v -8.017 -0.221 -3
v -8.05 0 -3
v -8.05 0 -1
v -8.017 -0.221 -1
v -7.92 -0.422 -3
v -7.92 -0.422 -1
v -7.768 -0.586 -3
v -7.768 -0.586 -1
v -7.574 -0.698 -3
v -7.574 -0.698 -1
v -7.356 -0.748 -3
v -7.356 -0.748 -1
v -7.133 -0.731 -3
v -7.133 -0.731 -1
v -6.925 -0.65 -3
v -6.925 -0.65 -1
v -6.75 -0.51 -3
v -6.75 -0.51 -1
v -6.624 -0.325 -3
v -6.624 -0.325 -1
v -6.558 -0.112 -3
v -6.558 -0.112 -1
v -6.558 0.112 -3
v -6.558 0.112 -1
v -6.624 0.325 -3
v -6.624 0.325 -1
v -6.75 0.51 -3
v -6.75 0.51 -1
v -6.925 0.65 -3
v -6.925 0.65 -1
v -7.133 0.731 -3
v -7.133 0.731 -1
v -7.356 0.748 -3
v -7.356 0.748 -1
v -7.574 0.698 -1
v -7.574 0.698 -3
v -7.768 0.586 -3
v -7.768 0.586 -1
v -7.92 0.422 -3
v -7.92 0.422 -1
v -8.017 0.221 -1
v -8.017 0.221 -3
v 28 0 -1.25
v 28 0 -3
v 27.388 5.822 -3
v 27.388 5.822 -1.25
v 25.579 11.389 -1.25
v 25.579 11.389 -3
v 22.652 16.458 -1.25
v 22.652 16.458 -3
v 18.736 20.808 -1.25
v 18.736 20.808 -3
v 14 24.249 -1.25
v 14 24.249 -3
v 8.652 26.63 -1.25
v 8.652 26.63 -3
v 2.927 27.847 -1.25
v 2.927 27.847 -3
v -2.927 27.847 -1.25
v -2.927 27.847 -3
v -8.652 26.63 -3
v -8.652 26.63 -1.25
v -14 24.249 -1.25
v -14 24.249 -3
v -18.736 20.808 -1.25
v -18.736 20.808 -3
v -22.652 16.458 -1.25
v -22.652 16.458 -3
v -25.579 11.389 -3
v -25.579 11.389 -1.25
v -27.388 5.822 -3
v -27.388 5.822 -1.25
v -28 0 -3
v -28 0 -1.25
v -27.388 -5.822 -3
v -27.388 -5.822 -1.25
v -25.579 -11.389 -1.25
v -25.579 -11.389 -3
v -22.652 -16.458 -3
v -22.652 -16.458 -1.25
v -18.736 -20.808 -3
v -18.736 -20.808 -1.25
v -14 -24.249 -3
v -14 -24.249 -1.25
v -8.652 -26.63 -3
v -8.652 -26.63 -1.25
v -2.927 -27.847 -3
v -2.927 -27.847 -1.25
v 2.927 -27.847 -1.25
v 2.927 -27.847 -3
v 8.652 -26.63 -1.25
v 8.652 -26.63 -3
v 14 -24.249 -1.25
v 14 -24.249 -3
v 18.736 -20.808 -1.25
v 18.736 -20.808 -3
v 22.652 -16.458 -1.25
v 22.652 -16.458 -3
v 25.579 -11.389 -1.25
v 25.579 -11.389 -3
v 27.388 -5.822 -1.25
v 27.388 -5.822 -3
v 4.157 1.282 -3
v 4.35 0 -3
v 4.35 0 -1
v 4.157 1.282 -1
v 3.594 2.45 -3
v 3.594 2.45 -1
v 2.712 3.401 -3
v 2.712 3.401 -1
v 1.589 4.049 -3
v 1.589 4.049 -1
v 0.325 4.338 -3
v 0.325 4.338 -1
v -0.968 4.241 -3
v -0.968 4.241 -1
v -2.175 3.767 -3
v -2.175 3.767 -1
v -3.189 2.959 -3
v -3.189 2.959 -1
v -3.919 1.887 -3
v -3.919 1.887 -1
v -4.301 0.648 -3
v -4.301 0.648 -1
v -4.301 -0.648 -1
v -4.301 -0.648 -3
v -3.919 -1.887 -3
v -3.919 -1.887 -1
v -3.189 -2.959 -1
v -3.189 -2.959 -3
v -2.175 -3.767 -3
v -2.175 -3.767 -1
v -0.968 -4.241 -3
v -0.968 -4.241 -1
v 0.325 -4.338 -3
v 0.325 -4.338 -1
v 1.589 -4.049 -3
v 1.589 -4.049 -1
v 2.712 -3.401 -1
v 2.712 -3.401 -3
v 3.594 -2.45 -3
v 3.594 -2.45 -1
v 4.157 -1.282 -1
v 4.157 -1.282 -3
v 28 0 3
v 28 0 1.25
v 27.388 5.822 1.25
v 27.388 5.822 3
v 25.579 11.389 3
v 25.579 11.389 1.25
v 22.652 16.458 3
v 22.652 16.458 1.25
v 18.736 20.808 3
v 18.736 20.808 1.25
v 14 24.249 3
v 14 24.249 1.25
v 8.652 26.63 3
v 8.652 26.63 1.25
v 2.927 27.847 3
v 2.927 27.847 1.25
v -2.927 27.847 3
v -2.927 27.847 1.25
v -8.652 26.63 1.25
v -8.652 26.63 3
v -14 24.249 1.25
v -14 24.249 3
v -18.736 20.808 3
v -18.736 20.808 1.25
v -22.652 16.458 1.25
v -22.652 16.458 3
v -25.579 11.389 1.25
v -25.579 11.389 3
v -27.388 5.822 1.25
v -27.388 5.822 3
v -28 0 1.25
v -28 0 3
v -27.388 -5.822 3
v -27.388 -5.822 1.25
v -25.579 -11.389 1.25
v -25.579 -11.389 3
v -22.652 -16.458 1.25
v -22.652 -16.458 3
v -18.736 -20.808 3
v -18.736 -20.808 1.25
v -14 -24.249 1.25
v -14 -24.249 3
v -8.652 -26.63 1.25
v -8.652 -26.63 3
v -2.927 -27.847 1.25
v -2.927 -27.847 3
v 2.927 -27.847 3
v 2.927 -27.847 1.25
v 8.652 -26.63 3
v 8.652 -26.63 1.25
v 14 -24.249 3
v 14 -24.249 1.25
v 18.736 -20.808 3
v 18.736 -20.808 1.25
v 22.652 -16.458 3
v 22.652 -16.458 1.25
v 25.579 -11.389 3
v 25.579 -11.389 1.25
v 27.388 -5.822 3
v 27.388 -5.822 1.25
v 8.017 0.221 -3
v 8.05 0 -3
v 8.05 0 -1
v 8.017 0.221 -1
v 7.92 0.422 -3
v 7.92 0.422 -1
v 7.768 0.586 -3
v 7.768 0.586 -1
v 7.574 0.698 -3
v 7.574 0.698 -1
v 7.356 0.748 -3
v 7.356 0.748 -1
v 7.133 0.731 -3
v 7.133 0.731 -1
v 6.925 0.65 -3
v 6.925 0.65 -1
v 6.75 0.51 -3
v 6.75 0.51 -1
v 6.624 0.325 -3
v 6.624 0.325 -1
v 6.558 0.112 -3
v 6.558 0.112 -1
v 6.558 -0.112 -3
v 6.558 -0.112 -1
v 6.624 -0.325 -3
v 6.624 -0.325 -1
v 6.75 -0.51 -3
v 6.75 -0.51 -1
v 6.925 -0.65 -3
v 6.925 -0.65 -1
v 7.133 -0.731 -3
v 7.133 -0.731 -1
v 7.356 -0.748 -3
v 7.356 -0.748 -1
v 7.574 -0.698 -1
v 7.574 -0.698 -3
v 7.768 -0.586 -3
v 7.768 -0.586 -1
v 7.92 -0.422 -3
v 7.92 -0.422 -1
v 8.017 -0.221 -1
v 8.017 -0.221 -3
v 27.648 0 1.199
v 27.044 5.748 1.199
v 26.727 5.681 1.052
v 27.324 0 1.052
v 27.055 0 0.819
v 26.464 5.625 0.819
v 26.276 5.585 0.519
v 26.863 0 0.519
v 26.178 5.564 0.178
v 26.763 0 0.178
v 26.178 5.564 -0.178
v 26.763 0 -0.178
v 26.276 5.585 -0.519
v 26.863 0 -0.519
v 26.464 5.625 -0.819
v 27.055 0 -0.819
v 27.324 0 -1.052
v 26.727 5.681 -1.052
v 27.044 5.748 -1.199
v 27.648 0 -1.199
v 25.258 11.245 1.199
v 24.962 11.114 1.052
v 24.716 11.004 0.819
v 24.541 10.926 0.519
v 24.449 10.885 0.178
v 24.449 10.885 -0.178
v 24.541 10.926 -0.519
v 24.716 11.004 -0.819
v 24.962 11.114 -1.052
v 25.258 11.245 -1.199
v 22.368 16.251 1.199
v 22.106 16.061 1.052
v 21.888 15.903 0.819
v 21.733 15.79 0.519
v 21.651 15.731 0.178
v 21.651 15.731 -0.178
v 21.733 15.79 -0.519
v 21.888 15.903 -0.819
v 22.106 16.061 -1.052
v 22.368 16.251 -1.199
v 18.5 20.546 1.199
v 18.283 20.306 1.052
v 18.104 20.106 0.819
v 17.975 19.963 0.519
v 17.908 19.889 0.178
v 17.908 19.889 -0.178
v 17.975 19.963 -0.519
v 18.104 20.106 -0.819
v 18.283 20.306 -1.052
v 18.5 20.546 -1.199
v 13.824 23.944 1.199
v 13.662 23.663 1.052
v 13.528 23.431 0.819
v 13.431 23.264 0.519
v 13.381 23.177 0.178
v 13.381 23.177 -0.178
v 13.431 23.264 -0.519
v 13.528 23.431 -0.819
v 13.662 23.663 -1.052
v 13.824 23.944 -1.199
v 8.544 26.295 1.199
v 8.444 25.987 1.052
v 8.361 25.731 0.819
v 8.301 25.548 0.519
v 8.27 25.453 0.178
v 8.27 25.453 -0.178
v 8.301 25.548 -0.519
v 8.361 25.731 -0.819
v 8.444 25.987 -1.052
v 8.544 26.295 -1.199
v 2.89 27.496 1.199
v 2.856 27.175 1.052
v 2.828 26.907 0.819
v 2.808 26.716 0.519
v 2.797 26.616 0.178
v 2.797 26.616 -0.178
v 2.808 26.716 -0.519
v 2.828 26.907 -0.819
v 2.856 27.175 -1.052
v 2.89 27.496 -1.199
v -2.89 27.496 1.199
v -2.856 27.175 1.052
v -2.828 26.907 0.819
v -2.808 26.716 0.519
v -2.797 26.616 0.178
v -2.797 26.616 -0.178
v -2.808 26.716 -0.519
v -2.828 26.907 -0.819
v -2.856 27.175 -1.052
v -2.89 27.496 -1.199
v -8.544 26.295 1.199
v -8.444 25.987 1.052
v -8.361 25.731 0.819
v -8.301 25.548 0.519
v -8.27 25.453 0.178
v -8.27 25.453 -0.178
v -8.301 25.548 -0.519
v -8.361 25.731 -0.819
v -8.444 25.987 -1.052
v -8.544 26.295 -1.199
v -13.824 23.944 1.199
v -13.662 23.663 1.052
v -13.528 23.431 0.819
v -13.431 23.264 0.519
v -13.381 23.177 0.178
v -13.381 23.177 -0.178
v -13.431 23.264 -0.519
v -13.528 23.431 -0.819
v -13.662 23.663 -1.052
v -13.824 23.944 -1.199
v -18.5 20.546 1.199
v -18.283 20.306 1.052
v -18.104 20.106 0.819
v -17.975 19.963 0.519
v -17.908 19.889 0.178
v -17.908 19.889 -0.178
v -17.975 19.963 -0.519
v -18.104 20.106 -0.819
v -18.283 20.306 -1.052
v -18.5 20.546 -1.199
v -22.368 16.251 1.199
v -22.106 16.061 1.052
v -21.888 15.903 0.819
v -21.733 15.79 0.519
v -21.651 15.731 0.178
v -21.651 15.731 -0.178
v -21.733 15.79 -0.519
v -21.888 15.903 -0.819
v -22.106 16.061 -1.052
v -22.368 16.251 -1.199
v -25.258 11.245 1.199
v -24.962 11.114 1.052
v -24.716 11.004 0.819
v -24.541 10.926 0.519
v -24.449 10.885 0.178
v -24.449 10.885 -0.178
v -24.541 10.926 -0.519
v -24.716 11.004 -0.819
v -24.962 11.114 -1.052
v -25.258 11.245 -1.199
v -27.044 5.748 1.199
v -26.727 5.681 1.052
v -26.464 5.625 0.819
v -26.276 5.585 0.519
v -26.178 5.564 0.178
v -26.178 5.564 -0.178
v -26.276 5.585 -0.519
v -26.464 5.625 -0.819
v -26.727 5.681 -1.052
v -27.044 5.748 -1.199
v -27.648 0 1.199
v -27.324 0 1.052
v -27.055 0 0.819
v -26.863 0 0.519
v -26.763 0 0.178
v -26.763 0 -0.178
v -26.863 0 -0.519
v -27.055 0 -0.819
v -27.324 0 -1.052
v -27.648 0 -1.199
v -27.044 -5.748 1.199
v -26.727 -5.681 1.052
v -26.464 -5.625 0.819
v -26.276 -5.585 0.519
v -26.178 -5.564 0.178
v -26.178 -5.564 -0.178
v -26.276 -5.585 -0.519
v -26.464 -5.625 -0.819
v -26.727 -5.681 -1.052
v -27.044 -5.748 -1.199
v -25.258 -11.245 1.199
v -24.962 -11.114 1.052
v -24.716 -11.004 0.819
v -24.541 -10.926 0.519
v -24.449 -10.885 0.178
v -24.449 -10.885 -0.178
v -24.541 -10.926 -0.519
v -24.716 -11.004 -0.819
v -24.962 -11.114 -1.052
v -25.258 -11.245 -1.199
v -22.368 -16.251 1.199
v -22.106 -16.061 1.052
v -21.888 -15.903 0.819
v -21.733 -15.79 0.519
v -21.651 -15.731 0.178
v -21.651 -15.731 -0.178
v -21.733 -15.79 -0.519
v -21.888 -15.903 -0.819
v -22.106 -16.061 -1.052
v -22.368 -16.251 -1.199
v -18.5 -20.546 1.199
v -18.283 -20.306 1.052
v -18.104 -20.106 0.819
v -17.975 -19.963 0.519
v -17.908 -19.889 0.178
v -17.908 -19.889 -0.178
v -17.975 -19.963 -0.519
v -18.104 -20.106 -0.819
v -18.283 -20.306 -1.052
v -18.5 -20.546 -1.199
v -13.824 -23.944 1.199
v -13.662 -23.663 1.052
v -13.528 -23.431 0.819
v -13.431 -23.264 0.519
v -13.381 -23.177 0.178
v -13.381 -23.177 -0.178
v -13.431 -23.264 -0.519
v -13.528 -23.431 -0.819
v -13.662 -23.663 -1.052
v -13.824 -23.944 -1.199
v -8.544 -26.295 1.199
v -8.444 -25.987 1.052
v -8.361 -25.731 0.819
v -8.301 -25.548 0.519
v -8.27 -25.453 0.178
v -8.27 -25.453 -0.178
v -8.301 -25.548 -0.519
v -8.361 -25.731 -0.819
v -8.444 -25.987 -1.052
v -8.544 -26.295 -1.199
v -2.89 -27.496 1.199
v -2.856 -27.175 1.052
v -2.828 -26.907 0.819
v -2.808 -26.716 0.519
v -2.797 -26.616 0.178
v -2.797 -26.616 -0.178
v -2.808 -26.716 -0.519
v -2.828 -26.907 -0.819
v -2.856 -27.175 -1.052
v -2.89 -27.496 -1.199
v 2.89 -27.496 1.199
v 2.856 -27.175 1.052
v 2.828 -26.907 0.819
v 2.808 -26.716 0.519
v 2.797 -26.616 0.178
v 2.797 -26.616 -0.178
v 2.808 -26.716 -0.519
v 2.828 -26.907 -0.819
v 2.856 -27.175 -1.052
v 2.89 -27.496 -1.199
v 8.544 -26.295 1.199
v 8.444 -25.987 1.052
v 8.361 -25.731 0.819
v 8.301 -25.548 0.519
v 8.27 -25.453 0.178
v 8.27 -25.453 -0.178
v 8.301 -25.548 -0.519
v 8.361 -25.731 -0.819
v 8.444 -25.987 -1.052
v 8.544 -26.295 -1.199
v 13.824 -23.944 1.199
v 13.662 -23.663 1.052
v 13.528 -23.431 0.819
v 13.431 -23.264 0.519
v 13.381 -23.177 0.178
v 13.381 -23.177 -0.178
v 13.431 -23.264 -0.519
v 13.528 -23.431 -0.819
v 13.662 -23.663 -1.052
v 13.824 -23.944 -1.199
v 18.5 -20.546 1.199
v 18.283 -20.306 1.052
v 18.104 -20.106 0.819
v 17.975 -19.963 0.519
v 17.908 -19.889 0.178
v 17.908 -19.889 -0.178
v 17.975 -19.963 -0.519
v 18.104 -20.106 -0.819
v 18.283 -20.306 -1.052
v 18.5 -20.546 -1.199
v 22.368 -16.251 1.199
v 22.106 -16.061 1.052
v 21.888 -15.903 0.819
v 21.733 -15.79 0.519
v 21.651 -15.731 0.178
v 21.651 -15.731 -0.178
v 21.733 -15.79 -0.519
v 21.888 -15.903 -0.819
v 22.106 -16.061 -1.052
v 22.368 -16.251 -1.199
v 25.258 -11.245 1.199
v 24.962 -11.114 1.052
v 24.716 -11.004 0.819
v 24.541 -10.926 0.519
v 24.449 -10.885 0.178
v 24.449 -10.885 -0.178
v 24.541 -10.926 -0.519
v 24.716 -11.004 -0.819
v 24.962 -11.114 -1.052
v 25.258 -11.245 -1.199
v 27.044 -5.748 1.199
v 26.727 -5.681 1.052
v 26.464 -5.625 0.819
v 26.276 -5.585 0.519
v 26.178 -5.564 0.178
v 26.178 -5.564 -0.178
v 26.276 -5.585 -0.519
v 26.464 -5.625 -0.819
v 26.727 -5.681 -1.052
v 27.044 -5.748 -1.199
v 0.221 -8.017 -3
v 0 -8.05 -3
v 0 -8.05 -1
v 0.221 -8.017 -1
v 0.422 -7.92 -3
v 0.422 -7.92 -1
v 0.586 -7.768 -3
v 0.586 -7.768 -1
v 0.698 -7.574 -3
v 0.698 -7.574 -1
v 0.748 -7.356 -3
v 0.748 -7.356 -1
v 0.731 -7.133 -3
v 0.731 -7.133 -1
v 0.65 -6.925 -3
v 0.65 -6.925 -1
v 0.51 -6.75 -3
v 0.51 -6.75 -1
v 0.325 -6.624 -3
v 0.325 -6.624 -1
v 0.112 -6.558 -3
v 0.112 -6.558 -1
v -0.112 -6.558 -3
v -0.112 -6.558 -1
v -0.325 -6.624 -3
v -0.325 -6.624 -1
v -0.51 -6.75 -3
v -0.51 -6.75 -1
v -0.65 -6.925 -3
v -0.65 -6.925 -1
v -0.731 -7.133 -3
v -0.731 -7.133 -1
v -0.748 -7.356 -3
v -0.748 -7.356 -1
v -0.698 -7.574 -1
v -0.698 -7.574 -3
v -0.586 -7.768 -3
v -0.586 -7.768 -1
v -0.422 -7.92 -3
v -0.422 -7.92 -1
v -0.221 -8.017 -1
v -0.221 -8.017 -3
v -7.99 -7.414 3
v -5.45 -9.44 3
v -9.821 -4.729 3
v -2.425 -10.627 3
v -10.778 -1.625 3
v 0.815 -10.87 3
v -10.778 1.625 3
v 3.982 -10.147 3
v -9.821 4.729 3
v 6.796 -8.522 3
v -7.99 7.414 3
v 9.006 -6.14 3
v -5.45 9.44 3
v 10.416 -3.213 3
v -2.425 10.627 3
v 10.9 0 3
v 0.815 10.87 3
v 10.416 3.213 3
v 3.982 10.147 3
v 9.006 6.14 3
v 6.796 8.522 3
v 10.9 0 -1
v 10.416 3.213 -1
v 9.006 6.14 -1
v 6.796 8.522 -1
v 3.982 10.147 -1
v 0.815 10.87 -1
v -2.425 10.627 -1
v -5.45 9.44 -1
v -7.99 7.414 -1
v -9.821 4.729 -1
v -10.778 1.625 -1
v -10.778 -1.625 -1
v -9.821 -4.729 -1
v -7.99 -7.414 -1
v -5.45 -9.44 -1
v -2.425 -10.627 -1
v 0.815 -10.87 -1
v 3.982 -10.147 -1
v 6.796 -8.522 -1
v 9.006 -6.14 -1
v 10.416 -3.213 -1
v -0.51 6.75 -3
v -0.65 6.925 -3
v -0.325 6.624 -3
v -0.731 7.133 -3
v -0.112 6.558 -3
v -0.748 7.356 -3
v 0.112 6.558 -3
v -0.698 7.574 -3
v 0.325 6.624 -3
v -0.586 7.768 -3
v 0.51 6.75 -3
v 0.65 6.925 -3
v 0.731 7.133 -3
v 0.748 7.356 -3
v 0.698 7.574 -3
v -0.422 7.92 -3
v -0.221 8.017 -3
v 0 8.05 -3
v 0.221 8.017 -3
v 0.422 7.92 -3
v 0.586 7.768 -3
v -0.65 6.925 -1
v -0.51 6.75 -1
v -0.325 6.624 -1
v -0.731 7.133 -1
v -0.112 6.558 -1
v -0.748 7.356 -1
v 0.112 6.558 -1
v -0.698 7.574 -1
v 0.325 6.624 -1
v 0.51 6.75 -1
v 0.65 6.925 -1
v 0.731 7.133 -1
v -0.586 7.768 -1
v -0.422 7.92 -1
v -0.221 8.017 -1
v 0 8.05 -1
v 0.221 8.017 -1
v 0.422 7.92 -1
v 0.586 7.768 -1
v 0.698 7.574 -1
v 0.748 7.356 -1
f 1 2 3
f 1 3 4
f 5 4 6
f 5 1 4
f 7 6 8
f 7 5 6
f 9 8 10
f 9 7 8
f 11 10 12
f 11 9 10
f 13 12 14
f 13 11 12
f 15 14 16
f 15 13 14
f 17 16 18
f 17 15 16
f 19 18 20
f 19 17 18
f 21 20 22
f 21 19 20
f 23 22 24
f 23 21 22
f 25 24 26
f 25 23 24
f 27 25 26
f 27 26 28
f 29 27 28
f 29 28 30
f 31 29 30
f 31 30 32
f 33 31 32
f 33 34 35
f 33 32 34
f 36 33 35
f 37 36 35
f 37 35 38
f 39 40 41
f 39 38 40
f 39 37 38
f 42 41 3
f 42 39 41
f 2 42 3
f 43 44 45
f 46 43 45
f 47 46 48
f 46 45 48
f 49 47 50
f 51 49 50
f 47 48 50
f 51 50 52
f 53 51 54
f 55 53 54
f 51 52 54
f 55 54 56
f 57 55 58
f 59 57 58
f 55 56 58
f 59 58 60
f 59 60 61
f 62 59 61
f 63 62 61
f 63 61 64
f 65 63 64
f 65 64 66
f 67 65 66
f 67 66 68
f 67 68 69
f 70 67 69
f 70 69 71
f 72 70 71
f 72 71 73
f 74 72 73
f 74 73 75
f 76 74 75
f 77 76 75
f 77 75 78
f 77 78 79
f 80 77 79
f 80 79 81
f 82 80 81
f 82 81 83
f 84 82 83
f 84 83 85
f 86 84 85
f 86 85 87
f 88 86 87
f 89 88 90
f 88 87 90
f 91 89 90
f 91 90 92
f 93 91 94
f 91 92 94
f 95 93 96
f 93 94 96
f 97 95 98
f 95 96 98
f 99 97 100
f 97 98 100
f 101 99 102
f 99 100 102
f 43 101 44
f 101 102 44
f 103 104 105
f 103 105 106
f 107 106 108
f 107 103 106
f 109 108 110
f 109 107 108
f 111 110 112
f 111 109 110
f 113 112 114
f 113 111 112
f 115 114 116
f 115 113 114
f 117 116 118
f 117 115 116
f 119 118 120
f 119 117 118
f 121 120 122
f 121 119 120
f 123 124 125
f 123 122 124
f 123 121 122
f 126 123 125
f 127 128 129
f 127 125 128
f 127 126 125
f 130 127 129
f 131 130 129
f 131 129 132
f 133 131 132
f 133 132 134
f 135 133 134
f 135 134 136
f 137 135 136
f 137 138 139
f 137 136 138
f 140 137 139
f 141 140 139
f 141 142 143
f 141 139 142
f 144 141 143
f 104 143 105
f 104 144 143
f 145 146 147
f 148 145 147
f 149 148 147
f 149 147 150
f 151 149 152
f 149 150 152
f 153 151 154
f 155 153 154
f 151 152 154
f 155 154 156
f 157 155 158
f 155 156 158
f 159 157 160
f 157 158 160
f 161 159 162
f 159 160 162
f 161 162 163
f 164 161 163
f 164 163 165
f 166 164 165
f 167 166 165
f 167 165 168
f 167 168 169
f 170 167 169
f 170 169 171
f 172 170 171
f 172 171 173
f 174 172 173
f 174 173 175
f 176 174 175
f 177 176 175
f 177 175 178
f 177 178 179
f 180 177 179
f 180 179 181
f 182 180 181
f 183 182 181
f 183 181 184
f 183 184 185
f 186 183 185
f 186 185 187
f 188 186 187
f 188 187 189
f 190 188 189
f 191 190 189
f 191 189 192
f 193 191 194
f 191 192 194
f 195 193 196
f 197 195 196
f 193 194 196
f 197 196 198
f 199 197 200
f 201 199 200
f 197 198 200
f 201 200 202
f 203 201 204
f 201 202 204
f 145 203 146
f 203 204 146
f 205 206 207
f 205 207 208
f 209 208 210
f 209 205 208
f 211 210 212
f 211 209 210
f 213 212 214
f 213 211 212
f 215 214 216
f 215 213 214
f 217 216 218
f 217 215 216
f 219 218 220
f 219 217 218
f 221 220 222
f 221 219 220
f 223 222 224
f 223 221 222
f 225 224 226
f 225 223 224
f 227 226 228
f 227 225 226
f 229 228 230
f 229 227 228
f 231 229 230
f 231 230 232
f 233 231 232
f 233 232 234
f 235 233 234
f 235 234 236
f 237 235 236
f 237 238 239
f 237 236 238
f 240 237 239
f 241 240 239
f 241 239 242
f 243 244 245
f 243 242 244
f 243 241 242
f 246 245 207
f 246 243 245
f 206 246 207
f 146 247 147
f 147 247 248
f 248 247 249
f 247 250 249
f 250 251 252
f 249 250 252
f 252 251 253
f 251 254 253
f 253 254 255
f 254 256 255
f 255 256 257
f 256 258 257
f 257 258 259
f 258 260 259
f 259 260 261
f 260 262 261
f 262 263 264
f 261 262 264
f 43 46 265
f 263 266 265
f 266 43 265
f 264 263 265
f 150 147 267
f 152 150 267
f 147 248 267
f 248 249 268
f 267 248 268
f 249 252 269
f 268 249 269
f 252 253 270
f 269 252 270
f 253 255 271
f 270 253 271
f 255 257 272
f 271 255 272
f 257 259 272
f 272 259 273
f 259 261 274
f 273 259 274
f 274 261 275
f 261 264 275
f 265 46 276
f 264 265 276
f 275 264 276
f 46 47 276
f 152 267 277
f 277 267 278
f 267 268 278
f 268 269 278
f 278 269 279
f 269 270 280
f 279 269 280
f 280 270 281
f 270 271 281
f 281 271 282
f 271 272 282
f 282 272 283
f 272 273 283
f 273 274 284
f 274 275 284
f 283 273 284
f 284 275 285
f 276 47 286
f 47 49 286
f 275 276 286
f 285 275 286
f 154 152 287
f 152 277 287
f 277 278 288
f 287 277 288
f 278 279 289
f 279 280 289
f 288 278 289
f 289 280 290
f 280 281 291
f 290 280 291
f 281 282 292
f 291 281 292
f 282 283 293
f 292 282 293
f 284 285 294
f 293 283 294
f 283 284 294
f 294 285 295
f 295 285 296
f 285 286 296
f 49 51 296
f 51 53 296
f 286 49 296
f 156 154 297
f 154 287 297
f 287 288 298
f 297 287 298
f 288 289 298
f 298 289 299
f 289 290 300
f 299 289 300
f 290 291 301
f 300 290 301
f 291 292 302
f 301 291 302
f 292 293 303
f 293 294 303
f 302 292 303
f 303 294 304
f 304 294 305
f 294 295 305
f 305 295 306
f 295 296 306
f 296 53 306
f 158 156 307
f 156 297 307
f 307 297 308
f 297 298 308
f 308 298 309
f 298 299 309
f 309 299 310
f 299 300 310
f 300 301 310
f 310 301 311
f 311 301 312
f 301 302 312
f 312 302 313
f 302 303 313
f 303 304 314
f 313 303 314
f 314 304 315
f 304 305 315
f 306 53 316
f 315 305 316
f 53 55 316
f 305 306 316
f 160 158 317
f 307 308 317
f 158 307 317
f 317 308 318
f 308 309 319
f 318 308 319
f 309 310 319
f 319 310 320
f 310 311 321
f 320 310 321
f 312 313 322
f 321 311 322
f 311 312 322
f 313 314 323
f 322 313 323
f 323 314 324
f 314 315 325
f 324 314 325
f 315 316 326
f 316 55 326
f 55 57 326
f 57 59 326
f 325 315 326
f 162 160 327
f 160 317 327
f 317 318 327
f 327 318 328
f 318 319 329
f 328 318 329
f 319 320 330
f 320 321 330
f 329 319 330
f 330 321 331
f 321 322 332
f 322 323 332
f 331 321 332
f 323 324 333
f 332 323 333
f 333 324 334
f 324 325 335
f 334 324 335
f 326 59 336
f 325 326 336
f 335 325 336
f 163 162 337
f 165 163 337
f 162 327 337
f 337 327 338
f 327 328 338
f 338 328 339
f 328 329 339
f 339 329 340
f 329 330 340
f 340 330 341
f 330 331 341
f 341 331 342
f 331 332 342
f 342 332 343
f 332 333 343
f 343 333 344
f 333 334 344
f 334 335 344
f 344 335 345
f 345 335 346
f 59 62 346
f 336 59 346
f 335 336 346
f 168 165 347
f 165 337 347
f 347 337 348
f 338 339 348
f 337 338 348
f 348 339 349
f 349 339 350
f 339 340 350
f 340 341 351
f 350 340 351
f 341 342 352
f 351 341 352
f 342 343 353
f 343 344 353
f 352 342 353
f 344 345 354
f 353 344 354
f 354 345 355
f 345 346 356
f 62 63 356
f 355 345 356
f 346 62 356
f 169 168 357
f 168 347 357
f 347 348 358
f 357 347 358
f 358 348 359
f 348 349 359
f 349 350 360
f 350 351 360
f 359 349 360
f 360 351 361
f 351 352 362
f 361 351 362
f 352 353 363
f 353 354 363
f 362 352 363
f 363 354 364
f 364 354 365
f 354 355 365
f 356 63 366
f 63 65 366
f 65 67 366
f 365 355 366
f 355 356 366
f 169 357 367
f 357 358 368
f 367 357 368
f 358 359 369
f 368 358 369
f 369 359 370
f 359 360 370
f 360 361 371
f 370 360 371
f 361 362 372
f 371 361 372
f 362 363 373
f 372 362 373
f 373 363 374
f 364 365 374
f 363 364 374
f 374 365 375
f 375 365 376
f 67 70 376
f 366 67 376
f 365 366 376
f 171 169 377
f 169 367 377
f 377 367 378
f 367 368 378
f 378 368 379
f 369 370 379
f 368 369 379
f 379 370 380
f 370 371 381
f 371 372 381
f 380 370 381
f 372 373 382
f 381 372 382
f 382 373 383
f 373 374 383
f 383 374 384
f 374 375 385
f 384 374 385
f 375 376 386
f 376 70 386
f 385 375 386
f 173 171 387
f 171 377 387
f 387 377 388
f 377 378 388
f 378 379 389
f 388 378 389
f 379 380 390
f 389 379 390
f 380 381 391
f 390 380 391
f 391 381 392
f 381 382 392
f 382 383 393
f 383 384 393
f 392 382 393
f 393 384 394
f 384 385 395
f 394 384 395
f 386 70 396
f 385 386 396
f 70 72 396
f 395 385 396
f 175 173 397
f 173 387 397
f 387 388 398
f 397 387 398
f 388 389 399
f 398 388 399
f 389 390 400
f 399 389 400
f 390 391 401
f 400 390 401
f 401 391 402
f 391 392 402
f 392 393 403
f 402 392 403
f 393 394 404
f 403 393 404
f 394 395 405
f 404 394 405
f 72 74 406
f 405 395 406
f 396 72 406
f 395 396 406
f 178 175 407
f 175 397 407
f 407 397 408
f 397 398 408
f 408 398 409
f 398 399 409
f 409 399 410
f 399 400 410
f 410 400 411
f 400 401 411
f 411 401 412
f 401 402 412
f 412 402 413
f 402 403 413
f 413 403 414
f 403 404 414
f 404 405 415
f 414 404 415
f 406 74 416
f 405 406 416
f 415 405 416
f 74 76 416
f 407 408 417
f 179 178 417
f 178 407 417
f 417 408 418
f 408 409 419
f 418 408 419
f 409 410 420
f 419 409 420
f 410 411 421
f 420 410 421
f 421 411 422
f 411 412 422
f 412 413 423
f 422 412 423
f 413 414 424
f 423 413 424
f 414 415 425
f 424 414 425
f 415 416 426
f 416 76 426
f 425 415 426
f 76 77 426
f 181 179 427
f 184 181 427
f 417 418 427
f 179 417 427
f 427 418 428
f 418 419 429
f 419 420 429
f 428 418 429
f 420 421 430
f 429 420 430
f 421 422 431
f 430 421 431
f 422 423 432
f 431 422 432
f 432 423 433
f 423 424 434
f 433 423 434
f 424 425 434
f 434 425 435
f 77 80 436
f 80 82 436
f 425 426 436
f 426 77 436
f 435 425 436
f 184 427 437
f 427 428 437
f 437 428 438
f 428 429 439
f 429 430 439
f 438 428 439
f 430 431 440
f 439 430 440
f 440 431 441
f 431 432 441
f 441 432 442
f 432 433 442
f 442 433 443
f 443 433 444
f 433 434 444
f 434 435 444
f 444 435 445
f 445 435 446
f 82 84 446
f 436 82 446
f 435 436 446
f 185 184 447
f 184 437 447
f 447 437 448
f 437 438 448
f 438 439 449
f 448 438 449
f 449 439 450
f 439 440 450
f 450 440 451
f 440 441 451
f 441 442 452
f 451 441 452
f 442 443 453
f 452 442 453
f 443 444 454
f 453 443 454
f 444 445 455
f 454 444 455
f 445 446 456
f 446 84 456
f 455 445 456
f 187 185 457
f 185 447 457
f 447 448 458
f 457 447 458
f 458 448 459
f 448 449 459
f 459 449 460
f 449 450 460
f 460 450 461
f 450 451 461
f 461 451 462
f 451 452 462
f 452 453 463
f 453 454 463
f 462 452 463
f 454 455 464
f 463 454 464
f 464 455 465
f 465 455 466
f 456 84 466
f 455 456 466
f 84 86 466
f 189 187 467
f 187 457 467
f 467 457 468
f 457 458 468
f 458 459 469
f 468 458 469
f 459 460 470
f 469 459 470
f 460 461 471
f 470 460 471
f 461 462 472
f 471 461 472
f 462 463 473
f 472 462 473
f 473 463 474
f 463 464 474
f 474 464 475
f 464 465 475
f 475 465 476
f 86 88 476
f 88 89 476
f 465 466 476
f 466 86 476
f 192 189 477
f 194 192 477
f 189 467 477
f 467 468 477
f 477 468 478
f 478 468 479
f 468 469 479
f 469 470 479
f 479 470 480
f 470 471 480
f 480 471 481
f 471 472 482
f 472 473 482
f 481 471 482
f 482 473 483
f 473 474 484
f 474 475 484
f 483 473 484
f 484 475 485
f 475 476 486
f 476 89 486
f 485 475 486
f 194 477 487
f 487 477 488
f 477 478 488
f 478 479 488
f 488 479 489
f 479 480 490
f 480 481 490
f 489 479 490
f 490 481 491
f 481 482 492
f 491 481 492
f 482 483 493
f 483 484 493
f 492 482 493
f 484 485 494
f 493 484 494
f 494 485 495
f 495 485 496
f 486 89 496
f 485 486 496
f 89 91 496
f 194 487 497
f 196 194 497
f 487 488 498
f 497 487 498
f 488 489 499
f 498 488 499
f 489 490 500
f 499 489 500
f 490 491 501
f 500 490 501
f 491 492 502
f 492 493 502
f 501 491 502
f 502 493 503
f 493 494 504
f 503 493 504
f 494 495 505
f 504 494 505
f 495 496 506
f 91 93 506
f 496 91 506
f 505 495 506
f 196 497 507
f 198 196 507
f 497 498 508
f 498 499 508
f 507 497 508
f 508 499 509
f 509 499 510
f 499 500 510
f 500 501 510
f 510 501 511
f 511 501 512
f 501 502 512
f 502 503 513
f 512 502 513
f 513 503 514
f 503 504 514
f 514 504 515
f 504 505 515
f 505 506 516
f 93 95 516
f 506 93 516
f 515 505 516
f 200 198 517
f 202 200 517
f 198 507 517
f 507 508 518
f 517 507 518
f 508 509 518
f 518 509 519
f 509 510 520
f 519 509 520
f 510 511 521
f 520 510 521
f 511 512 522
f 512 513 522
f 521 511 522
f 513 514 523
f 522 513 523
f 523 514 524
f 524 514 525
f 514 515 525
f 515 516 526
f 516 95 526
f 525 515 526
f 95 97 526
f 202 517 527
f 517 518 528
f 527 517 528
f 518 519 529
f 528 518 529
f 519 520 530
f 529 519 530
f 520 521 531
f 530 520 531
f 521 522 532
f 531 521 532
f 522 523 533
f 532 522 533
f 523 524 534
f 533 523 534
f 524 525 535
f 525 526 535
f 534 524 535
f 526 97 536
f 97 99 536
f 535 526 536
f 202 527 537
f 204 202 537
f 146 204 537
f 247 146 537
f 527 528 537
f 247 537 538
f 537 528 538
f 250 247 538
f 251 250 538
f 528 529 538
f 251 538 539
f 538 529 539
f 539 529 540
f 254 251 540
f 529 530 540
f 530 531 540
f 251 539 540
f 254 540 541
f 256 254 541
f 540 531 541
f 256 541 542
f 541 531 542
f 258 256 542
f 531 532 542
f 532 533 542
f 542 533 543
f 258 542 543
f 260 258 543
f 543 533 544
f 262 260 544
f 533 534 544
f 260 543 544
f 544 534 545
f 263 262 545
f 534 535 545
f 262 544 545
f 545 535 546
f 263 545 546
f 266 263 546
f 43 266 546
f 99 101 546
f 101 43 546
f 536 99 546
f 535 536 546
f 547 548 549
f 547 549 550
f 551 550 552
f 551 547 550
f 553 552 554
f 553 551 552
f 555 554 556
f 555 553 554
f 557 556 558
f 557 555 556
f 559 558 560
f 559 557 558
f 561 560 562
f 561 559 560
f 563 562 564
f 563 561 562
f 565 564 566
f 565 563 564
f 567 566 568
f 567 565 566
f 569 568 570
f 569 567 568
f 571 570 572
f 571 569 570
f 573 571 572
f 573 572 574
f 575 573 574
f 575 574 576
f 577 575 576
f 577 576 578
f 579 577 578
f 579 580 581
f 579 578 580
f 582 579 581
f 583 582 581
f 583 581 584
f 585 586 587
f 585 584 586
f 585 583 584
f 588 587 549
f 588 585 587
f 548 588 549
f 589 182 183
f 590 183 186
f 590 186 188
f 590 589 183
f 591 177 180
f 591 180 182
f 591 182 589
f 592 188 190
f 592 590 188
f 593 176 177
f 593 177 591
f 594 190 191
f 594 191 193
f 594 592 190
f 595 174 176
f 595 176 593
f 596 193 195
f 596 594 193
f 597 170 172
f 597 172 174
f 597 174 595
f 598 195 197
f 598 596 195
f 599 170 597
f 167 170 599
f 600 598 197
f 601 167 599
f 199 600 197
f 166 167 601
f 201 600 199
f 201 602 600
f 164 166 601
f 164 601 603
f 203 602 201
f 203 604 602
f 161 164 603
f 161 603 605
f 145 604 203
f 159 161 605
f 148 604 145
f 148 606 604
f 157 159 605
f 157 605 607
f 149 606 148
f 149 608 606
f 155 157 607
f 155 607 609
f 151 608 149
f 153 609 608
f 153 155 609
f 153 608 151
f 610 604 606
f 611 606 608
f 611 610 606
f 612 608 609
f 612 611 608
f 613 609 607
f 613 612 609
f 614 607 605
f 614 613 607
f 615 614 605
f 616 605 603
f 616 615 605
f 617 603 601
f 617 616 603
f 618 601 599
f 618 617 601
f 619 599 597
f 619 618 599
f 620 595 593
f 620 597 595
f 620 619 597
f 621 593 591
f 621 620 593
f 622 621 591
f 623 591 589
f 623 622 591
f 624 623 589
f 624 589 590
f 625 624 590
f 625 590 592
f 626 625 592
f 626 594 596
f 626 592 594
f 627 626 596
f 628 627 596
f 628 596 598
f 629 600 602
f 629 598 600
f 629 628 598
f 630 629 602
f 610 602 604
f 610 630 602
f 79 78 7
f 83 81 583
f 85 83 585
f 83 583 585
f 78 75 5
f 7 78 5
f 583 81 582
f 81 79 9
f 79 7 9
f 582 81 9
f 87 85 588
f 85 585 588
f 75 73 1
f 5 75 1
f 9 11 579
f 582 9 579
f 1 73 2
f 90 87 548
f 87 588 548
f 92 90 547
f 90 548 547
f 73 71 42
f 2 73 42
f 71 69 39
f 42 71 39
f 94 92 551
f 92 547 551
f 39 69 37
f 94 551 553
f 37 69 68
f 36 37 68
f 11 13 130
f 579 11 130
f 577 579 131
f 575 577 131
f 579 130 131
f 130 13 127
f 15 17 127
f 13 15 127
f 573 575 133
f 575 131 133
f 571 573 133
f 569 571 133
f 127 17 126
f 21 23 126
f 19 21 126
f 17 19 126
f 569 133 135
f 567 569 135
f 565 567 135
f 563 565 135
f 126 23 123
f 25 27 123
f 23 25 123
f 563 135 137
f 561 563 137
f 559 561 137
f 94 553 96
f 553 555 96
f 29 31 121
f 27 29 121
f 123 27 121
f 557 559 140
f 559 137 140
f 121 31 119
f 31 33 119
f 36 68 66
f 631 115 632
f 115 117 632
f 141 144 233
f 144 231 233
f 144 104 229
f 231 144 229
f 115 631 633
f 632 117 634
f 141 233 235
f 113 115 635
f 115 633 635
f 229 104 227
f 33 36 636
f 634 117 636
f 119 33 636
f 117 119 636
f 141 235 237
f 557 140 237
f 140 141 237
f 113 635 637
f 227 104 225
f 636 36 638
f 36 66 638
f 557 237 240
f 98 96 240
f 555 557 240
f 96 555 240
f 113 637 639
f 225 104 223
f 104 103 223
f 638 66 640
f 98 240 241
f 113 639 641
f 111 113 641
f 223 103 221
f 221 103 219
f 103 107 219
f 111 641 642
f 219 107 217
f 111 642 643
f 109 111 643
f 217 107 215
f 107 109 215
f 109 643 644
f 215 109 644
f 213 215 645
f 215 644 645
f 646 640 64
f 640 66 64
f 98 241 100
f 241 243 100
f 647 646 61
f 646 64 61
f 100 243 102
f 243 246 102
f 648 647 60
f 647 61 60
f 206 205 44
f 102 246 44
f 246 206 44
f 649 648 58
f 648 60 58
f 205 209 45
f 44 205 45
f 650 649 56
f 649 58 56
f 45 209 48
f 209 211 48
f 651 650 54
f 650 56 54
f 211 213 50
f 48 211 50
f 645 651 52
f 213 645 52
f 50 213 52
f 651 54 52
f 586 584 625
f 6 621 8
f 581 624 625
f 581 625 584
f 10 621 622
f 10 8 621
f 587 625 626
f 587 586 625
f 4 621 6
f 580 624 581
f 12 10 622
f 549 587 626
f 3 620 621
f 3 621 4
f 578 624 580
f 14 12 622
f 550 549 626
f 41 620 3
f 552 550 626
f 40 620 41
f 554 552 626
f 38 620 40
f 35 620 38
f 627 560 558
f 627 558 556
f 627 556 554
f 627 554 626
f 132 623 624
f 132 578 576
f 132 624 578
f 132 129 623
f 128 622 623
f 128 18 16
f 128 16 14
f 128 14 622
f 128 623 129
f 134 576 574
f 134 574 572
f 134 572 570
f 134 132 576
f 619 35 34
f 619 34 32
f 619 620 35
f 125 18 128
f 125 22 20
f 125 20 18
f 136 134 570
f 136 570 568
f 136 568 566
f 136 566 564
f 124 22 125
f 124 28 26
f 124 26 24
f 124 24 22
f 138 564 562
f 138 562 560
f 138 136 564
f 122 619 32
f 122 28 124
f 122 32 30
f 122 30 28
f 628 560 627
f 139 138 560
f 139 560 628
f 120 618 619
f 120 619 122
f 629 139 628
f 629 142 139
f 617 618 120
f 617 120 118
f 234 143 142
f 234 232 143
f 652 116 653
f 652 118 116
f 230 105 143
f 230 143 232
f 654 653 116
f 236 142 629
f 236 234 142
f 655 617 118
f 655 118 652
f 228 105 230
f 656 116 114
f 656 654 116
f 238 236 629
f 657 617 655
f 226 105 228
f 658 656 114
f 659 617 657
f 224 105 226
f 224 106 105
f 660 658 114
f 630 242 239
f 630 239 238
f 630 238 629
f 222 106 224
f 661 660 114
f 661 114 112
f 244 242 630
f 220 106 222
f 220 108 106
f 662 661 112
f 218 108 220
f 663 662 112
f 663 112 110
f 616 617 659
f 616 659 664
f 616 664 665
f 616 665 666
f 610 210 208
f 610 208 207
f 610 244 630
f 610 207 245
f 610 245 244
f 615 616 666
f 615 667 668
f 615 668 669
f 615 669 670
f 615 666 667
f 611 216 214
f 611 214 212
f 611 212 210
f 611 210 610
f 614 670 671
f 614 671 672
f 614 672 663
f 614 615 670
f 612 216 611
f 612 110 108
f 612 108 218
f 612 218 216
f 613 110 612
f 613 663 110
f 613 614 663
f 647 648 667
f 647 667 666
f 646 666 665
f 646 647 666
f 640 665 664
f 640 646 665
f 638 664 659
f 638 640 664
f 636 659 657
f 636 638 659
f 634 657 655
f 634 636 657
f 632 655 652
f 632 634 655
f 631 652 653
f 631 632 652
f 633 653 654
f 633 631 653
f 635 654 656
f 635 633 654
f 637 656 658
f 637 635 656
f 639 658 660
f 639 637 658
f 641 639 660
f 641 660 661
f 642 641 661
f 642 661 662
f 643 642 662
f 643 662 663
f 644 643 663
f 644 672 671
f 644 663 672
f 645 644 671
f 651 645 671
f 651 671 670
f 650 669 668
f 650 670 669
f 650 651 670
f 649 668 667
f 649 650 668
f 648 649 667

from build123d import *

# Parameters (mm, degrees)
CYLINDER003_R     = 0.75
CYLINDER003_DEPTH = 10
ARRAY_COUNT       = 4
CYLINDER002_R     = 4.35
CYLINDER002_DEPTH = 10
CYLINDER001_R     = 10.9
CYLINDER001_DEPTH = 10
TORUS_R           = 1.25
CYLINDER_R        = 28
CYLINDER_DEPTH    = 6


with BuildPart() as array:
    # Cylinder003 → Cylinder003 (new body)
    with BuildSketch(Plane(origin=(7.3, 0, -5), x_dir=(1, 0, 0), z_dir=(0, 0, 1))):
        Circle(CYLINDER003_R)
    extrude(amount=CYLINDER003_DEPTH)

    # Array: Array ×4 about axis
    array_axis = Axis((0, 0, 0), (0, 0, 1))


with BuildPart() as array_1:
    add(array.part)
    for i in range(1, ARRAY_COUNT):
        add(array.part.rotate(array_axis, i * 360 / ARRAY_COUNT))


with BuildPart() as hueco_eje:
    # Cylinder002 → Cylinder002 (new body)
    with BuildSketch(Plane.XY.offset(-10)):
        Circle(CYLINDER002_R)
    extrude(amount=CYLINDER002_DEPTH)


with BuildPart() as cylinder:
    # Cylinder001 → Cylinder001 (new body)
    with BuildSketch(Plane.XY.offset(-1)):
        Circle(CYLINDER001_R)
    extrude(amount=CYLINDER001_DEPTH)


with BuildPart() as junta_torica:
    # Torus → Torus (revolve)
    with BuildSketch(Plane.XZ):
        with Locations((28, 0)):
            Circle(TORUS_R)
    revolve(axis=Axis((0, 0, 0), (0, 0, 1)))


with BuildPart() as cut003:
    # Cylinder → Cylinder (new body)
    with BuildSketch(Plane.XY.offset(-3)):
        Circle(CYLINDER_R)
    extrude(amount=CYLINDER_DEPTH)

    # Cut: cut junta_torica
    add(junta_torica.part, mode=Mode.SUBTRACT)

    # Cut001: cut Cylinder
    add(cylinder.part, mode=Mode.SUBTRACT)

    # Cut002: cut hueco_eje
    add(hueco_eje.part, mode=Mode.SUBTRACT)

    # Cut003: cut Array
    add(array_1.part, mode=Mode.SUBTRACT)


solid = cut003.part
